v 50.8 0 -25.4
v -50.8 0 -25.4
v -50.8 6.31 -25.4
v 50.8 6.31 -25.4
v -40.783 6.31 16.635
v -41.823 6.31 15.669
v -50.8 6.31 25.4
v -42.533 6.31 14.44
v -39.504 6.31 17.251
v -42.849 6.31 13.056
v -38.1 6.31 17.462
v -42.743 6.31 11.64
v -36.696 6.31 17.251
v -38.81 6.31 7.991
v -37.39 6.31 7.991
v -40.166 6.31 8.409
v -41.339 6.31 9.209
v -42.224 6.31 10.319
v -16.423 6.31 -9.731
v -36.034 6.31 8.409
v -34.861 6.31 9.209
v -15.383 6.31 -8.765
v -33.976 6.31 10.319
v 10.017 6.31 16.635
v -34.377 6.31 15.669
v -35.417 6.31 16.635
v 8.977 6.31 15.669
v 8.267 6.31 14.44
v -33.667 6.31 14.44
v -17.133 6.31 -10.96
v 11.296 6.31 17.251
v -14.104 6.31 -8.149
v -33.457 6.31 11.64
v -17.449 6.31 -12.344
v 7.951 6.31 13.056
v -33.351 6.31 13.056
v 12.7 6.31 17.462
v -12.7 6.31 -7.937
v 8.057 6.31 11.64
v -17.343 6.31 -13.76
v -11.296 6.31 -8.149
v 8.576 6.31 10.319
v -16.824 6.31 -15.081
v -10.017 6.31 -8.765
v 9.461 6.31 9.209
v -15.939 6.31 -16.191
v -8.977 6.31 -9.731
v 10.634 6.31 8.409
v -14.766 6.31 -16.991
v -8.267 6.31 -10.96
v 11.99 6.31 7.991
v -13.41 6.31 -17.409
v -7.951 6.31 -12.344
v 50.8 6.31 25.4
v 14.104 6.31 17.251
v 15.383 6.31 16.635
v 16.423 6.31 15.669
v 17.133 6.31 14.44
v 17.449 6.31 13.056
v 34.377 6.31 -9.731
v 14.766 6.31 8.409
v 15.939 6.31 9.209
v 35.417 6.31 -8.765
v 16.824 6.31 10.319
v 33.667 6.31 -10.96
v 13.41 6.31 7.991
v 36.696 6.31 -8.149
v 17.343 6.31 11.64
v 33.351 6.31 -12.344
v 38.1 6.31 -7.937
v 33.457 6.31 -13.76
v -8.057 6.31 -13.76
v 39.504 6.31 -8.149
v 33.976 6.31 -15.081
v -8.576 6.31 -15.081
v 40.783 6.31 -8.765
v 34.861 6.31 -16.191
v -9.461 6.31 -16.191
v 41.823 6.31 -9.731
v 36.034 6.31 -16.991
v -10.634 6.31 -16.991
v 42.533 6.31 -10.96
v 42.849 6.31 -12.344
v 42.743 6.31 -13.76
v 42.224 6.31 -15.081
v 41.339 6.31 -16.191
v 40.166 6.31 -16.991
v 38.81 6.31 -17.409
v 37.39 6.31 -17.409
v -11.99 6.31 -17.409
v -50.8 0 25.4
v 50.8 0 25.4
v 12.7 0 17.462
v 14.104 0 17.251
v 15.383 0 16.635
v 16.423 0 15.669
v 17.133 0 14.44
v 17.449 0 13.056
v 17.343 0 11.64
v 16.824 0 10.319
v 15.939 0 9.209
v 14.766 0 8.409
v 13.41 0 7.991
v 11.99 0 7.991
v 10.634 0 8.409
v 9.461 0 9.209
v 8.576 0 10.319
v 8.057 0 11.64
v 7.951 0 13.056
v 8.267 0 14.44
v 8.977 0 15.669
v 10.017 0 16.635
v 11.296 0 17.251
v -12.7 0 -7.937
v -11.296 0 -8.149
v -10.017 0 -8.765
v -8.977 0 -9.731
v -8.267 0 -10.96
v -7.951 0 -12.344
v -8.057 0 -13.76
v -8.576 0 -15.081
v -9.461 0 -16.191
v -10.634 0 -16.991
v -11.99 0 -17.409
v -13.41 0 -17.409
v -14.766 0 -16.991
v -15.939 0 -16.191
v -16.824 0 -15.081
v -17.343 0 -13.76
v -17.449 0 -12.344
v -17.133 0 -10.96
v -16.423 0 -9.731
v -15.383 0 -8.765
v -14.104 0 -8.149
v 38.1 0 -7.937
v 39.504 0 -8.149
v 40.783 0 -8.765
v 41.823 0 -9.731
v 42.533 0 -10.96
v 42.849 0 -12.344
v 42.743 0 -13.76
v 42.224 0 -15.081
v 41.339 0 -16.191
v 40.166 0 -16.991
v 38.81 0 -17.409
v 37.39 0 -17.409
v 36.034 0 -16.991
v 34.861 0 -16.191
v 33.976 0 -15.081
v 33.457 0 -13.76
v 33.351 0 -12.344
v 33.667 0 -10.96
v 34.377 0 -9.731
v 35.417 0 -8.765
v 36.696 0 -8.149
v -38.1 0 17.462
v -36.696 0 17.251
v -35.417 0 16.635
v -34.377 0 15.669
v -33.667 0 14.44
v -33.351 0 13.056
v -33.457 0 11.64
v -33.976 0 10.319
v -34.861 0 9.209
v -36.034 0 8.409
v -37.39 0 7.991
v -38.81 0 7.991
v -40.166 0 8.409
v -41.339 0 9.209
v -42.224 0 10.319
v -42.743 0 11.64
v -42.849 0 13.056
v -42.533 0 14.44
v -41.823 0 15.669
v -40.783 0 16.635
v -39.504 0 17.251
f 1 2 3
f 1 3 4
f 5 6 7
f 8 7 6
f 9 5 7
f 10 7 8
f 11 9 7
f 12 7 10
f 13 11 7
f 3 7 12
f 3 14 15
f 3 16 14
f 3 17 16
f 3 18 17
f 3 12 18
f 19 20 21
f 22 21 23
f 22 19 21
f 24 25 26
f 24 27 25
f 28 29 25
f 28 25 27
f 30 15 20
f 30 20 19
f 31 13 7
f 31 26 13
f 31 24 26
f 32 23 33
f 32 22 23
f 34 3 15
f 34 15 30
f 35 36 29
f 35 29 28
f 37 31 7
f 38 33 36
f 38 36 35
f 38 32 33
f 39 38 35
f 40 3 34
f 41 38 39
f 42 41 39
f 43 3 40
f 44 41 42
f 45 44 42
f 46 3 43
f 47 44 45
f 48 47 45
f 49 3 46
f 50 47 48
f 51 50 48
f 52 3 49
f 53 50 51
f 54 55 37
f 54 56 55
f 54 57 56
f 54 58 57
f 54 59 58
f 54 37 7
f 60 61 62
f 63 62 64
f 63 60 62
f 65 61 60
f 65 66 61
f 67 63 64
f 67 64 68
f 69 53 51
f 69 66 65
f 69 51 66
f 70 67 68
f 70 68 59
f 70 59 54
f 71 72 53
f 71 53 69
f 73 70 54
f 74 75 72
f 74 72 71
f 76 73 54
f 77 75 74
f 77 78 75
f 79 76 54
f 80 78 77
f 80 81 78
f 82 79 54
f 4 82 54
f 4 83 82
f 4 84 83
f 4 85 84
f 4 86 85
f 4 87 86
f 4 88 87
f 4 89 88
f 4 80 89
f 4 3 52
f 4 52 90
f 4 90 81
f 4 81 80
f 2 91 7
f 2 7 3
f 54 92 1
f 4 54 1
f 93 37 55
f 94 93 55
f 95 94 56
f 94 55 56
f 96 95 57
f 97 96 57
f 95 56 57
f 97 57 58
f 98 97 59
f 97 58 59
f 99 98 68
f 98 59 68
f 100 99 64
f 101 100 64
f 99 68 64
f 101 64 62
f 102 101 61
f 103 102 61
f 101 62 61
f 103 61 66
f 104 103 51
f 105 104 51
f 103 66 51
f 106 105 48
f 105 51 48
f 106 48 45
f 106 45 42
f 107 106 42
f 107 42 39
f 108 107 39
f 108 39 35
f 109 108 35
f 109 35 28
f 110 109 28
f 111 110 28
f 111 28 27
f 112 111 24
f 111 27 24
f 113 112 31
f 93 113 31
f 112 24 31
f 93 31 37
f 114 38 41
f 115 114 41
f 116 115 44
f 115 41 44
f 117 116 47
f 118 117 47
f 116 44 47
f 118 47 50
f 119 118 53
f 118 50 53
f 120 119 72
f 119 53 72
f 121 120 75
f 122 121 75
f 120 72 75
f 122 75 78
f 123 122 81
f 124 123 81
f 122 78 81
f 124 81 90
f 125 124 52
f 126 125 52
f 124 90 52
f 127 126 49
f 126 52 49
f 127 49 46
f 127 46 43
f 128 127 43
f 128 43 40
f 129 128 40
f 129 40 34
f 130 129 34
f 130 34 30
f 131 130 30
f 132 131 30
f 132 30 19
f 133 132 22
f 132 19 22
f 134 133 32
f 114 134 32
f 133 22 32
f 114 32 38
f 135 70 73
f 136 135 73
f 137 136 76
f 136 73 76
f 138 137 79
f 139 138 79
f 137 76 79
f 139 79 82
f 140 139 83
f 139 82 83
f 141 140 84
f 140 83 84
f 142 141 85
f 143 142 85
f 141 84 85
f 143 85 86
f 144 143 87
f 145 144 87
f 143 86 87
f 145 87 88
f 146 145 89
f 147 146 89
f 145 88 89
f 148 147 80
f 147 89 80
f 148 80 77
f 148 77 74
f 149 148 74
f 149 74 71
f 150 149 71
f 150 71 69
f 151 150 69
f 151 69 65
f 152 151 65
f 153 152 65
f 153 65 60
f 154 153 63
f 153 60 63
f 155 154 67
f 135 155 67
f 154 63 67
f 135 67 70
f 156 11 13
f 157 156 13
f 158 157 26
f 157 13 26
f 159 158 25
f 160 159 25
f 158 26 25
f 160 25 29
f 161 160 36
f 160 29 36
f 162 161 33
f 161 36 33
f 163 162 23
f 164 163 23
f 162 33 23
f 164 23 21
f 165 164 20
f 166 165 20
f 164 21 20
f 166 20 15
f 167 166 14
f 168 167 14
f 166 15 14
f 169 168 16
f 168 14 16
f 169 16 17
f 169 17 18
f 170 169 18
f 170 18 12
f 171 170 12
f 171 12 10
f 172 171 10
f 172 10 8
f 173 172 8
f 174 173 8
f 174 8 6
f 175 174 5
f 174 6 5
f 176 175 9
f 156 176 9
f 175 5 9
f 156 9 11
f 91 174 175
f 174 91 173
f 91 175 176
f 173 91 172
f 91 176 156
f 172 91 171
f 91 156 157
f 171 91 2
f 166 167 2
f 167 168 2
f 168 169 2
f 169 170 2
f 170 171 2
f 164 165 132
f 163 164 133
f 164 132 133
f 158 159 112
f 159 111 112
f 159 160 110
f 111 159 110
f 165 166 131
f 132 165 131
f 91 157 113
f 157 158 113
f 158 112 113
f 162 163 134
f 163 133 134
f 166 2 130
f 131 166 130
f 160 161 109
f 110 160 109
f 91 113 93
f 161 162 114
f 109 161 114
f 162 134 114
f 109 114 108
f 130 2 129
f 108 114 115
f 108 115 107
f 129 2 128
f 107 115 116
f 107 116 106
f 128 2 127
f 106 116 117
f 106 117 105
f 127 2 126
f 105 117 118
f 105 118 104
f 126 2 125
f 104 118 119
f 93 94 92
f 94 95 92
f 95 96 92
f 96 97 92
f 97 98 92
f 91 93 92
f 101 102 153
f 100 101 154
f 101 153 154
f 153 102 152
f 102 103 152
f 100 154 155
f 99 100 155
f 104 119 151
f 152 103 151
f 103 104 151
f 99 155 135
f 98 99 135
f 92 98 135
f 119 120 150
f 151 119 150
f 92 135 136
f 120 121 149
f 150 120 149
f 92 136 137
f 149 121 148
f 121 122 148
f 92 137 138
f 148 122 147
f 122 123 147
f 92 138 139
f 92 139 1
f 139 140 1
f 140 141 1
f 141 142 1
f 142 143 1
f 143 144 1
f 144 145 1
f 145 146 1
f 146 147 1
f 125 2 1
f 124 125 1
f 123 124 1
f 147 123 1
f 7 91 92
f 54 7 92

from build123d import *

# Parameters (mm, degrees)
CROQUIS1_W              = 101.6
CROQUIS1_H              = 50.8
SALIENTE_EXTRUIR1_DEPTH = 6.31
CROQUIS2_R              = 4.7625
CORTAR_EXTRUIR1_DEPTH   = 6.31
MATRIZL1_COUNT          = 2
MATRIZL1_PITCH          = 50.8


with BuildPart() as part:
    # Croquis1 → Saliente-Extruir1 (new body)
    with BuildSketch(Plane(origin=(0, 0, 0), x_dir=(1, 0, 0), z_dir=(0, 1, 0))):
        Rectangle(CROQUIS1_W, CROQUIS1_H)
    extrude(amount=SALIENTE_EXTRUIR1_DEPTH)

    # Croquis2 → Cortar-Extruir1 (cut)
    with BuildSketch(Plane(origin=(0, 6.31, 0), x_dir=(1, 0, 0), z_dir=(0, 1, 0))):
        with Locations(Location((-38.1, -12.7, 0), (0, 0, 270))):
            Circle(CROQUIS2_R)
        with Locations(Location((-12.7, 12.7, 0), (0, 0, 270))):
            Circle(CROQUIS2_R)
    cortar_extruir1 = extrude(amount=-CORTAR_EXTRUIR1_DEPTH, mode=Mode.SUBTRACT)

    # MatrizL1: Cortar-Extruir1 ×2
    with Locations(*[(i * MATRIZL1_PITCH, 0, 0) for i in range(1, MATRIZL1_COUNT)]):
        add(cortar_extruir1, mode=Mode.SUBTRACT)


solid = part.part
